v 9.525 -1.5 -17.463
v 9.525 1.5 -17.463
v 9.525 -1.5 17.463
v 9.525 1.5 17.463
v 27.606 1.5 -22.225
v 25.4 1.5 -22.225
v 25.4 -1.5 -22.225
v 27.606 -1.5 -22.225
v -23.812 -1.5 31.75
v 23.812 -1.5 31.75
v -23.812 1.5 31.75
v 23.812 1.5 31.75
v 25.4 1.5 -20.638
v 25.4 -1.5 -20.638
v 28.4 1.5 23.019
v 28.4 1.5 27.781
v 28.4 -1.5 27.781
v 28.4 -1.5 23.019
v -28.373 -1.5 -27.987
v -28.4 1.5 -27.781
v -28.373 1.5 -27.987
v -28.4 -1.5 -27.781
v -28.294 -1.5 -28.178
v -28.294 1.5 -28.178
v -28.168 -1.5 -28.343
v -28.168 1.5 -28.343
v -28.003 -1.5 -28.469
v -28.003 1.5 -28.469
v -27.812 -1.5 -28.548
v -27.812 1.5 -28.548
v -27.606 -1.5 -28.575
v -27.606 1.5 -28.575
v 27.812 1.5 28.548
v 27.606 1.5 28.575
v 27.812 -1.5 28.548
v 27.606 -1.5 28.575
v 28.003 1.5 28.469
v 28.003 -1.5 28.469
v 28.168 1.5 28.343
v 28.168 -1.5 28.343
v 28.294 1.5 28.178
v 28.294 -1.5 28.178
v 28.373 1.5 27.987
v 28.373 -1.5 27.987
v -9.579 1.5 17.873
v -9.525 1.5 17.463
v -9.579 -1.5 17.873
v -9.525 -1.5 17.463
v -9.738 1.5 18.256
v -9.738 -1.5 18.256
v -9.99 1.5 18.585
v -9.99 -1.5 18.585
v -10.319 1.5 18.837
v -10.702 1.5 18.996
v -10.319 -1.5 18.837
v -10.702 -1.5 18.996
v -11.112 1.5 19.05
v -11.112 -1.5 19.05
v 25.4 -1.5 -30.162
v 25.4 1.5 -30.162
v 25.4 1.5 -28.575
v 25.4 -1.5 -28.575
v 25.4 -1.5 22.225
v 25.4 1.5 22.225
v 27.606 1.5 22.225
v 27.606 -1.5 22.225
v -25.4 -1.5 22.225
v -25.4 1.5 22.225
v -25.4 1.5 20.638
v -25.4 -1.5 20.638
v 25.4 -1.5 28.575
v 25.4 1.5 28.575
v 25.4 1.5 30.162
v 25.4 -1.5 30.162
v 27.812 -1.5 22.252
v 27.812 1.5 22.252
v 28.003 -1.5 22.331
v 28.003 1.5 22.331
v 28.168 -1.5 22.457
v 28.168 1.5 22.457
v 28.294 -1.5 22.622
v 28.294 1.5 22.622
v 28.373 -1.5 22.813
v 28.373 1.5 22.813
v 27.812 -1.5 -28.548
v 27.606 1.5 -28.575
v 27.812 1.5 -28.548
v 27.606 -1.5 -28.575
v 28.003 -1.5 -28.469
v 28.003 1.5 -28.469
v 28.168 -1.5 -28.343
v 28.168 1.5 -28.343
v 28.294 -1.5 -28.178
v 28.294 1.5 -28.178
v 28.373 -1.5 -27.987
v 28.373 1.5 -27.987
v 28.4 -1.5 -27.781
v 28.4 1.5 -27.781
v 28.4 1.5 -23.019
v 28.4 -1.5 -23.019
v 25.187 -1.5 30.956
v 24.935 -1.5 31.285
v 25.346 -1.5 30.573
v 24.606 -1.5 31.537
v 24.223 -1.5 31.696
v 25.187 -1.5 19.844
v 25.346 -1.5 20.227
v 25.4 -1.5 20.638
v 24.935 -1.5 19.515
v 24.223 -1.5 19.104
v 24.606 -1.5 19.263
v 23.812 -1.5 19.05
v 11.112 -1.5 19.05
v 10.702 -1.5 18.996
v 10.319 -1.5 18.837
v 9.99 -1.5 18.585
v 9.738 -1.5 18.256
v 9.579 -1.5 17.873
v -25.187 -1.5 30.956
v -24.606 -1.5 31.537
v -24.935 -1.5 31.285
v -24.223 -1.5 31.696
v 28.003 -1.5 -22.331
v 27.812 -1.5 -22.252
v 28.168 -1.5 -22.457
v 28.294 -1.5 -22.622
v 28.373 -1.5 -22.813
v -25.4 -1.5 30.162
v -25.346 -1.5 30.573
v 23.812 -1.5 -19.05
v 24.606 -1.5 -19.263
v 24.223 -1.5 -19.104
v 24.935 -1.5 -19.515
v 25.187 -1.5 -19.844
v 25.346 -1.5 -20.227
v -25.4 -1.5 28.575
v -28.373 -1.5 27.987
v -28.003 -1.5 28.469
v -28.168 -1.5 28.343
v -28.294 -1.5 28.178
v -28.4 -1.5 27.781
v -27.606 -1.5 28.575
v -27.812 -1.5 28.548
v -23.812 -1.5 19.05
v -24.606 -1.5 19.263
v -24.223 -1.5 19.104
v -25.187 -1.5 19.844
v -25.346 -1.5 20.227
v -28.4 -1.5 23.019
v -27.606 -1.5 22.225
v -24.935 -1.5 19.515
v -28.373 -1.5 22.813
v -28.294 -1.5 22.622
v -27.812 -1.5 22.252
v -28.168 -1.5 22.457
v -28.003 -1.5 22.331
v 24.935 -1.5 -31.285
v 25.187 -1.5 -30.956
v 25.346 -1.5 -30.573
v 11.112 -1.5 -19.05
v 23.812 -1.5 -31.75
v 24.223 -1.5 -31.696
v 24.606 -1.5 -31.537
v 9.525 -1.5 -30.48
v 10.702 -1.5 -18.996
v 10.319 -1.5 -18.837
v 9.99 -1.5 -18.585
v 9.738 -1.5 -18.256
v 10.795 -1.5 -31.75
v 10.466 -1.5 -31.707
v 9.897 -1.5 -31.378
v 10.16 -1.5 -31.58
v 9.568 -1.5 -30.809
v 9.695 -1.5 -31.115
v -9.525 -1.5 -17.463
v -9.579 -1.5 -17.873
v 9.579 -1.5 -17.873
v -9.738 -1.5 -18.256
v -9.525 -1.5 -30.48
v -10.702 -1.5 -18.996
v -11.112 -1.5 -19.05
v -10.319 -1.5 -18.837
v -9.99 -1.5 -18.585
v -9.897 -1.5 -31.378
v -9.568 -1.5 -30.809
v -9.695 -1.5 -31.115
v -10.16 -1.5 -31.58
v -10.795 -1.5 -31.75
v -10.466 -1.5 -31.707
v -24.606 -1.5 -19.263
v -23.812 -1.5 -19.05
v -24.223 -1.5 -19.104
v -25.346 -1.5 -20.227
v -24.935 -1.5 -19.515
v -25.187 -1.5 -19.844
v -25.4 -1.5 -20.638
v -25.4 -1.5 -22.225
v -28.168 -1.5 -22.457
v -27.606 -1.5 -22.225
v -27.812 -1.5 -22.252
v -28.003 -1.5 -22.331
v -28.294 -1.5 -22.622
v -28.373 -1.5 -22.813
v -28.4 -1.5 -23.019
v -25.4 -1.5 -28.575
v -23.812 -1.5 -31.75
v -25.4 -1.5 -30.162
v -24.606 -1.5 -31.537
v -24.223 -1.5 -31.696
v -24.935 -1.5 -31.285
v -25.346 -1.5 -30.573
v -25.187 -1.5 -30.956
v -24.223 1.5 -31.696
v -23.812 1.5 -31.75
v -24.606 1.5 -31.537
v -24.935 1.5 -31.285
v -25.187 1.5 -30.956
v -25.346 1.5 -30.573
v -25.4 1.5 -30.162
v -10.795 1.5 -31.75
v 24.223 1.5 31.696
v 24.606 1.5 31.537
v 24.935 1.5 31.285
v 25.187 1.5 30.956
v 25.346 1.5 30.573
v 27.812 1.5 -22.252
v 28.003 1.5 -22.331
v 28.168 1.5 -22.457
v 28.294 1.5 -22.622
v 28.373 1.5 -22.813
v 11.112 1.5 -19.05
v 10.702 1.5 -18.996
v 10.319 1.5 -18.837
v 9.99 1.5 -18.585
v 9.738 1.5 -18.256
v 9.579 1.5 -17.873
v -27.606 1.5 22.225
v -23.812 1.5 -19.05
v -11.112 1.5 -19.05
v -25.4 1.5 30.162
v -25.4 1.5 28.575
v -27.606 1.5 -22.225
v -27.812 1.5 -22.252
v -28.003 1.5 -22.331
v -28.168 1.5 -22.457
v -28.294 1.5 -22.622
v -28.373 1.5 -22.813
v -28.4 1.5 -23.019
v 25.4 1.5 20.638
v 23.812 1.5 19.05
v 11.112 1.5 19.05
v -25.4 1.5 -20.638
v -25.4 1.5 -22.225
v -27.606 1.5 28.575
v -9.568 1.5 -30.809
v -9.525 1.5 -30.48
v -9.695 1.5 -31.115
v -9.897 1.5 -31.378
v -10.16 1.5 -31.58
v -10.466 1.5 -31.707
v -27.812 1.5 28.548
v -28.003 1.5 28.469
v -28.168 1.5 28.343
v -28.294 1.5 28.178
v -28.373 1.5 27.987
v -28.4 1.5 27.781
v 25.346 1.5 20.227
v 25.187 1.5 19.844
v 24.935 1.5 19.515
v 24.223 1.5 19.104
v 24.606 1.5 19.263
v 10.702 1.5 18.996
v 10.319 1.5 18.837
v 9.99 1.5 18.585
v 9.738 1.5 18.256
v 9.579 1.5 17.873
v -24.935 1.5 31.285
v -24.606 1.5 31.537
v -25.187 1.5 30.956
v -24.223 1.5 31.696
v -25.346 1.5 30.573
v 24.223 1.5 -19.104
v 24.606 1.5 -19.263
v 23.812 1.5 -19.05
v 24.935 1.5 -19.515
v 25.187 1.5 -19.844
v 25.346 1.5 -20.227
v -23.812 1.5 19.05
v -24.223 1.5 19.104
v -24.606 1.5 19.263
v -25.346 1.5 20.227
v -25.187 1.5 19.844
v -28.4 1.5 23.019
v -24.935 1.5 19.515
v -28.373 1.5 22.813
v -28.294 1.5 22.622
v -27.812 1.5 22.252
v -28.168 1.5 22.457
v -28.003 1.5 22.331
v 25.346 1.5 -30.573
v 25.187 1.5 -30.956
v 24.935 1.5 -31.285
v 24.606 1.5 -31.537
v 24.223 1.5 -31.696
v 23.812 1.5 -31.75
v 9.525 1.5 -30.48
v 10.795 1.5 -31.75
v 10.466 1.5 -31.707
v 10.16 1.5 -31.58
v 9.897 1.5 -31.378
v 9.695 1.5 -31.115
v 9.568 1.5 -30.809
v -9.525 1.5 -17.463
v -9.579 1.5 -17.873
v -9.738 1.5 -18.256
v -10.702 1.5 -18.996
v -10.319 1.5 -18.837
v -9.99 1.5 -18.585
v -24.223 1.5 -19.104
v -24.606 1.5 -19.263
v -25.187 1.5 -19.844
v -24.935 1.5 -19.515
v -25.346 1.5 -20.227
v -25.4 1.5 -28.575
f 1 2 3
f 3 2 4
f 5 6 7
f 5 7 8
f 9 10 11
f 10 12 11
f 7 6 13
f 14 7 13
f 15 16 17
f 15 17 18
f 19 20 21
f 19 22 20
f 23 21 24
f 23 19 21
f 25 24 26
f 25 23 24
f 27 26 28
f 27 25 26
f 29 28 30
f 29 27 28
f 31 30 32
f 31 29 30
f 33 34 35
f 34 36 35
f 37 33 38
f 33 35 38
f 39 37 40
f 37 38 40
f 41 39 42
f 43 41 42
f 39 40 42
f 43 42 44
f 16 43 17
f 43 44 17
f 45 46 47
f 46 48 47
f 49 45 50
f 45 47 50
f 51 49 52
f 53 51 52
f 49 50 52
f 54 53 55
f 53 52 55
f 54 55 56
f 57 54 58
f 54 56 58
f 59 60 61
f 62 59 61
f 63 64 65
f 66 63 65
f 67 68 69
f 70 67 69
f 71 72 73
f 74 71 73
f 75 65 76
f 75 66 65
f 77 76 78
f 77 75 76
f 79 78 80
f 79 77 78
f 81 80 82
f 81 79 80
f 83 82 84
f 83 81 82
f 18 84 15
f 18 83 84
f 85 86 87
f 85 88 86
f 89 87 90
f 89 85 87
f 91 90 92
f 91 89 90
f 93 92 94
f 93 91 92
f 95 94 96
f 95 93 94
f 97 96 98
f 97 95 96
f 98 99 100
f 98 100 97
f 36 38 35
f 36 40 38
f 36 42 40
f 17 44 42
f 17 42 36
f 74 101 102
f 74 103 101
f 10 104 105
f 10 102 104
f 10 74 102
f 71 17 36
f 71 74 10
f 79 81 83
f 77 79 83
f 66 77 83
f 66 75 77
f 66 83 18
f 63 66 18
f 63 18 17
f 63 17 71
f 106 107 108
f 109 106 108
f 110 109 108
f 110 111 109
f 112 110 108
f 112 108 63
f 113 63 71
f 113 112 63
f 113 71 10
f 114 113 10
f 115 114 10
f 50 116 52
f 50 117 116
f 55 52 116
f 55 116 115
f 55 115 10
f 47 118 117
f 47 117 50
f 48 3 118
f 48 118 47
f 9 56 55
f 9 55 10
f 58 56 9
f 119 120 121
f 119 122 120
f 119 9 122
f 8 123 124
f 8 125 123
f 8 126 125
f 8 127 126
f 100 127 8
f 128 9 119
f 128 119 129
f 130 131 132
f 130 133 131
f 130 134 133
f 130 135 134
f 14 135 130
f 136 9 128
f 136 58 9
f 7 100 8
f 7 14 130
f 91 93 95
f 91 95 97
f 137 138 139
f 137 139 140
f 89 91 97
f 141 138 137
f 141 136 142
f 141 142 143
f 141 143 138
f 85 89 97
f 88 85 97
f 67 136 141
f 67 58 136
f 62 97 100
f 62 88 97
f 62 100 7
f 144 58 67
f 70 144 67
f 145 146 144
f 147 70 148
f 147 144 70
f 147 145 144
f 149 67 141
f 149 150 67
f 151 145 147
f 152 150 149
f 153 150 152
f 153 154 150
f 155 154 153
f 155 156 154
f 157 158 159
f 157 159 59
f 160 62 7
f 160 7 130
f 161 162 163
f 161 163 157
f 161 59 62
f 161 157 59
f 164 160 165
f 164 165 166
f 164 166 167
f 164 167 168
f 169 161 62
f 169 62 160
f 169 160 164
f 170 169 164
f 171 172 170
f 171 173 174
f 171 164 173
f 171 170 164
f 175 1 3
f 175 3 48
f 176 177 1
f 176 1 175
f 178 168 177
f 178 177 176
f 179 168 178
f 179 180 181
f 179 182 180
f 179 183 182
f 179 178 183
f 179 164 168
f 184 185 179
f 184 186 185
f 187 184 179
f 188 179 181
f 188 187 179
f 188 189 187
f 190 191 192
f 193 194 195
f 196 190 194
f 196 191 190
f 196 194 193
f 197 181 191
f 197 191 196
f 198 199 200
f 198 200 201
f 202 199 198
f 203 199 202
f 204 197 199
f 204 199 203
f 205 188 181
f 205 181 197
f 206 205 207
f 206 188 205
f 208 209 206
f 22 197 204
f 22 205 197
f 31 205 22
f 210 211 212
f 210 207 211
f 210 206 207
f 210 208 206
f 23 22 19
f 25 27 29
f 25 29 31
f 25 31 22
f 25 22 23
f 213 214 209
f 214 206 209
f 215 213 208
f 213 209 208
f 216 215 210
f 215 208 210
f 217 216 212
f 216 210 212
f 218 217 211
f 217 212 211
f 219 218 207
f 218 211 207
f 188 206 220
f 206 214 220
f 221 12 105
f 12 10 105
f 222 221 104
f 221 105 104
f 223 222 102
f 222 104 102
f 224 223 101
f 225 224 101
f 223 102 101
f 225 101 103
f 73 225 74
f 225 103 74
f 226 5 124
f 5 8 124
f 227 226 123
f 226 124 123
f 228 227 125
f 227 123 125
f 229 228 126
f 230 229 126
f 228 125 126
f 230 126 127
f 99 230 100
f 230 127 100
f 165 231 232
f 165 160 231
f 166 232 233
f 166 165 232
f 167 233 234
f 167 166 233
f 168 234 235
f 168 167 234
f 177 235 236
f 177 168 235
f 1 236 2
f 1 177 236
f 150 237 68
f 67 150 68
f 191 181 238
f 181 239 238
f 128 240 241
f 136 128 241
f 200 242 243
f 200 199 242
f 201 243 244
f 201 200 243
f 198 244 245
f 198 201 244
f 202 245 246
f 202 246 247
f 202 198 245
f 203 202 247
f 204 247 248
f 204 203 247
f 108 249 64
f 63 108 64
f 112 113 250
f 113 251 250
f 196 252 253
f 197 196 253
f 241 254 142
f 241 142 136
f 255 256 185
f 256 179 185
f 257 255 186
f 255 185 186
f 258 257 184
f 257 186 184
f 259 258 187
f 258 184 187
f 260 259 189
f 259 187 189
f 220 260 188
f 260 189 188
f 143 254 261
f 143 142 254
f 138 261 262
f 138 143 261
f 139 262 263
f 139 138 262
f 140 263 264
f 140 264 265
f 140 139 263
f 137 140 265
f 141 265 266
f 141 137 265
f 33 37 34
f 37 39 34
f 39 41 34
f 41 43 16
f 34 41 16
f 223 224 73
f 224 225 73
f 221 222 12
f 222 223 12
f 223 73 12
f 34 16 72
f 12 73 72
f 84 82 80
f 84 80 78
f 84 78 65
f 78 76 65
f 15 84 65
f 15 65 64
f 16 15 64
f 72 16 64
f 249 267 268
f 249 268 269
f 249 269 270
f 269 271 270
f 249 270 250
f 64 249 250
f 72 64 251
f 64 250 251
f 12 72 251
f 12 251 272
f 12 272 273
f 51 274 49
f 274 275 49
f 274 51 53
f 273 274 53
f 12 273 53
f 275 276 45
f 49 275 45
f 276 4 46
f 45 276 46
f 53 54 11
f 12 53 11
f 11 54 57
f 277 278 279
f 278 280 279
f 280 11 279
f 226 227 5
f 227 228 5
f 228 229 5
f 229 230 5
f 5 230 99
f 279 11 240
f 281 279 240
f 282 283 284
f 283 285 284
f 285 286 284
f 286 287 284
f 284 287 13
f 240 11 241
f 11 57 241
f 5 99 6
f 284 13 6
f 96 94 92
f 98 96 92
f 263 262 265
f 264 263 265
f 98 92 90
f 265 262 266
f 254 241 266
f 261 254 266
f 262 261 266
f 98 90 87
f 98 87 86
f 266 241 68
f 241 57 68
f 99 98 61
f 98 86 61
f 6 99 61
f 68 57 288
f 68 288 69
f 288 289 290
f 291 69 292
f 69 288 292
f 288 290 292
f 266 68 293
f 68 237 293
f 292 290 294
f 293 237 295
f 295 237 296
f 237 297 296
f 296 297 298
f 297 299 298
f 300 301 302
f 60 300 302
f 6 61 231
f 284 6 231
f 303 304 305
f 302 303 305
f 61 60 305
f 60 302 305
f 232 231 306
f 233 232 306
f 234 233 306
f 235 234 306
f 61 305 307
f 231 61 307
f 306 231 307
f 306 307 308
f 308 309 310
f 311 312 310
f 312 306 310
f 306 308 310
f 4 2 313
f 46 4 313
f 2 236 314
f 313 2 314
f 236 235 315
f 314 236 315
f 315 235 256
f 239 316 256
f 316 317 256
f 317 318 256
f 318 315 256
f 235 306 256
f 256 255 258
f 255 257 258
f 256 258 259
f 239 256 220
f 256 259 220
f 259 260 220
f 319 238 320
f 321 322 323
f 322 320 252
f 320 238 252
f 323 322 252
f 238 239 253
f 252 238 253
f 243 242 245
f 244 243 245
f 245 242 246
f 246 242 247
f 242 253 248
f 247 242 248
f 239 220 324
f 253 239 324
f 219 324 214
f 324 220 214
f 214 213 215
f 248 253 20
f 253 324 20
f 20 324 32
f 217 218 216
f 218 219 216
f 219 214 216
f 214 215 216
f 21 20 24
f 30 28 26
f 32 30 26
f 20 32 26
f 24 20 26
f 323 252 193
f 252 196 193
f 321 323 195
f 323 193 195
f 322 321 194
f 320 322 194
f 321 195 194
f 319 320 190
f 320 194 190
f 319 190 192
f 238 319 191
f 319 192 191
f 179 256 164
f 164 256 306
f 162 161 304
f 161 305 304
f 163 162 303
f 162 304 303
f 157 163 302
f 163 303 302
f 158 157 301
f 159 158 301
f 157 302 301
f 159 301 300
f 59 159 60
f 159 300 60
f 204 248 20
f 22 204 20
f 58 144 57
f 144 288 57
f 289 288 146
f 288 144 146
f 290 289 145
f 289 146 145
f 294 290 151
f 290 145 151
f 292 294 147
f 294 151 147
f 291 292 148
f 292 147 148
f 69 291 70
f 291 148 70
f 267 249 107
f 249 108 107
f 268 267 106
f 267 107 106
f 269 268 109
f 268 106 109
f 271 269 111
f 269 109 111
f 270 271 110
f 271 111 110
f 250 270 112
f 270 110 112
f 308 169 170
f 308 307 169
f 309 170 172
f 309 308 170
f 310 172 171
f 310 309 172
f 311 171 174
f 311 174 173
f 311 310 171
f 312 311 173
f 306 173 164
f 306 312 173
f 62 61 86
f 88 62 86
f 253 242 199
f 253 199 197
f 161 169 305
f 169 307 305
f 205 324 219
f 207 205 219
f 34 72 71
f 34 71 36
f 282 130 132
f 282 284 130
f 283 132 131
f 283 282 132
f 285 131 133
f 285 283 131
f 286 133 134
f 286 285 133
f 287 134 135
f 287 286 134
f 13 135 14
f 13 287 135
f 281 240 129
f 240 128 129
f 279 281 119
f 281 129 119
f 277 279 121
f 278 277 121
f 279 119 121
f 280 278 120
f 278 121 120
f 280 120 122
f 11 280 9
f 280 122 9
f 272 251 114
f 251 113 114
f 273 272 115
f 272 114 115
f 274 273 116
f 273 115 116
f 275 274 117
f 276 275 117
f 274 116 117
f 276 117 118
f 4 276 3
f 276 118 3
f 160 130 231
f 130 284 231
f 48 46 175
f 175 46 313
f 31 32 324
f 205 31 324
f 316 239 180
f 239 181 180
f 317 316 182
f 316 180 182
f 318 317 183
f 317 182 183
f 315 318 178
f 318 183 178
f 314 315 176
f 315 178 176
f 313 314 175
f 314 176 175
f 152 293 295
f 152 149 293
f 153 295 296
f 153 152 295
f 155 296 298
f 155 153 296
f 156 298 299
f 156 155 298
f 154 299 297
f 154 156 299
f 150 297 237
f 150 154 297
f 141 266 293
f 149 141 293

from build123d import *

# Parameters (mm, degrees)
BOSS_EXTRUDE1_DEPTH = 1.5
FILLET1_R           = 1.5875
SKETCH2_W           = 3
SKETCH2_H           = 6.35
BOSS_EXTRUDE2_DEPTH = 3
FILLET2_R           = 0.79375
FILLET3_R           = 1.27


with BuildPart() as part:
    # Sketch1 → Boss-Extrude1 (new, symmetric)
    with BuildSketch(Plane(origin=(0, 0, 0), x_dir=(1, 0, 0), z_dir=(0, 1, 0))):
        Polygon((25.4, 19.05), (9.525, 19.05), (9.525, -19.05), (25.4, -19.05), (25.4, -31.75), (-25.4, -31.75), (-25.4, -19.05), (-9.525, -19.05), (-9.525, 19.05), (-25.4, 19.05), (-25.4, 31.75), (-9.525, 31.75), (-9.525, 30.48), (9.525, 30.48), (9.525, 31.75), (25.4, 31.75), align=None)
    extrude(amount=BOSS_EXTRUDE1_DEPTH, both=True)

    # Fillet1
    fillet1_edges = [part.edges().sort_by_distance(p)[0] for p in [
        (25.4, 0, -31.75),
        (25.4, 0, -19.05),
        (9.525, 0, -19.05),
        (9.525, 0, 19.05),
        (25.4, 0, 19.05),
        (25.4, 0, 31.75),
        (-25.4, 0, 31.75),
        (-25.4, 0, 19.05),
        (-9.525, 0, 19.05),
        (-9.525, 0, -19.05),
        (-25.4, 0, -19.05),
        (-25.4, 0, -31.75),
    ]]
    fillet(fillet1_edges, radius=FILLET1_R)

    # Sketch2 → Boss-Extrude2 (add)
    with BuildSketch(Plane(origin=(0, 1.5, 0), x_dir=(1, 0, 0), z_dir=(0, 1, 0))):
        with Locations((-26.9, 25.4)):
            Rectangle(SKETCH2_W, SKETCH2_H)
        with Locations((26.9, 25.4)):
            Rectangle(SKETCH2_W, SKETCH2_H)
        with Locations((26.9, -25.4)):
            Rectangle(SKETCH2_W, SKETCH2_H)
        with Locations((-26.9, -25.4)):
            Rectangle(SKETCH2_W, SKETCH2_H)
    extrude(amount=-BOSS_EXTRUDE2_DEPTH)

    # Fillet2
    fillet2_edges = [part.edges().sort_by_distance(p)[0] for p in [
        (-28.4, 0, 28.575),
        (-28.4, 0, 22.225),
        (28.4, 0, 22.225),
        (28.4, 0, 28.575),
        (28.4, 0, -28.575),
        (28.4, 0, -22.225),
        (-28.4, 0, -22.225),
        (-28.4, 0, -28.575),
    ]]
    fillet(fillet2_edges, radius=FILLET2_R)

    # Fillet3
    fillet3_edges = [part.edges().sort_by_distance(p)[0] for p in [
        (9.525, 0, -31.75),
        (-9.525, 0, -31.75),
    ]]
    fillet(fillet3_edges, radius=FILLET3_R - 0.0001)  # a hair under: the kernel refuses the full size


solid = part.part
